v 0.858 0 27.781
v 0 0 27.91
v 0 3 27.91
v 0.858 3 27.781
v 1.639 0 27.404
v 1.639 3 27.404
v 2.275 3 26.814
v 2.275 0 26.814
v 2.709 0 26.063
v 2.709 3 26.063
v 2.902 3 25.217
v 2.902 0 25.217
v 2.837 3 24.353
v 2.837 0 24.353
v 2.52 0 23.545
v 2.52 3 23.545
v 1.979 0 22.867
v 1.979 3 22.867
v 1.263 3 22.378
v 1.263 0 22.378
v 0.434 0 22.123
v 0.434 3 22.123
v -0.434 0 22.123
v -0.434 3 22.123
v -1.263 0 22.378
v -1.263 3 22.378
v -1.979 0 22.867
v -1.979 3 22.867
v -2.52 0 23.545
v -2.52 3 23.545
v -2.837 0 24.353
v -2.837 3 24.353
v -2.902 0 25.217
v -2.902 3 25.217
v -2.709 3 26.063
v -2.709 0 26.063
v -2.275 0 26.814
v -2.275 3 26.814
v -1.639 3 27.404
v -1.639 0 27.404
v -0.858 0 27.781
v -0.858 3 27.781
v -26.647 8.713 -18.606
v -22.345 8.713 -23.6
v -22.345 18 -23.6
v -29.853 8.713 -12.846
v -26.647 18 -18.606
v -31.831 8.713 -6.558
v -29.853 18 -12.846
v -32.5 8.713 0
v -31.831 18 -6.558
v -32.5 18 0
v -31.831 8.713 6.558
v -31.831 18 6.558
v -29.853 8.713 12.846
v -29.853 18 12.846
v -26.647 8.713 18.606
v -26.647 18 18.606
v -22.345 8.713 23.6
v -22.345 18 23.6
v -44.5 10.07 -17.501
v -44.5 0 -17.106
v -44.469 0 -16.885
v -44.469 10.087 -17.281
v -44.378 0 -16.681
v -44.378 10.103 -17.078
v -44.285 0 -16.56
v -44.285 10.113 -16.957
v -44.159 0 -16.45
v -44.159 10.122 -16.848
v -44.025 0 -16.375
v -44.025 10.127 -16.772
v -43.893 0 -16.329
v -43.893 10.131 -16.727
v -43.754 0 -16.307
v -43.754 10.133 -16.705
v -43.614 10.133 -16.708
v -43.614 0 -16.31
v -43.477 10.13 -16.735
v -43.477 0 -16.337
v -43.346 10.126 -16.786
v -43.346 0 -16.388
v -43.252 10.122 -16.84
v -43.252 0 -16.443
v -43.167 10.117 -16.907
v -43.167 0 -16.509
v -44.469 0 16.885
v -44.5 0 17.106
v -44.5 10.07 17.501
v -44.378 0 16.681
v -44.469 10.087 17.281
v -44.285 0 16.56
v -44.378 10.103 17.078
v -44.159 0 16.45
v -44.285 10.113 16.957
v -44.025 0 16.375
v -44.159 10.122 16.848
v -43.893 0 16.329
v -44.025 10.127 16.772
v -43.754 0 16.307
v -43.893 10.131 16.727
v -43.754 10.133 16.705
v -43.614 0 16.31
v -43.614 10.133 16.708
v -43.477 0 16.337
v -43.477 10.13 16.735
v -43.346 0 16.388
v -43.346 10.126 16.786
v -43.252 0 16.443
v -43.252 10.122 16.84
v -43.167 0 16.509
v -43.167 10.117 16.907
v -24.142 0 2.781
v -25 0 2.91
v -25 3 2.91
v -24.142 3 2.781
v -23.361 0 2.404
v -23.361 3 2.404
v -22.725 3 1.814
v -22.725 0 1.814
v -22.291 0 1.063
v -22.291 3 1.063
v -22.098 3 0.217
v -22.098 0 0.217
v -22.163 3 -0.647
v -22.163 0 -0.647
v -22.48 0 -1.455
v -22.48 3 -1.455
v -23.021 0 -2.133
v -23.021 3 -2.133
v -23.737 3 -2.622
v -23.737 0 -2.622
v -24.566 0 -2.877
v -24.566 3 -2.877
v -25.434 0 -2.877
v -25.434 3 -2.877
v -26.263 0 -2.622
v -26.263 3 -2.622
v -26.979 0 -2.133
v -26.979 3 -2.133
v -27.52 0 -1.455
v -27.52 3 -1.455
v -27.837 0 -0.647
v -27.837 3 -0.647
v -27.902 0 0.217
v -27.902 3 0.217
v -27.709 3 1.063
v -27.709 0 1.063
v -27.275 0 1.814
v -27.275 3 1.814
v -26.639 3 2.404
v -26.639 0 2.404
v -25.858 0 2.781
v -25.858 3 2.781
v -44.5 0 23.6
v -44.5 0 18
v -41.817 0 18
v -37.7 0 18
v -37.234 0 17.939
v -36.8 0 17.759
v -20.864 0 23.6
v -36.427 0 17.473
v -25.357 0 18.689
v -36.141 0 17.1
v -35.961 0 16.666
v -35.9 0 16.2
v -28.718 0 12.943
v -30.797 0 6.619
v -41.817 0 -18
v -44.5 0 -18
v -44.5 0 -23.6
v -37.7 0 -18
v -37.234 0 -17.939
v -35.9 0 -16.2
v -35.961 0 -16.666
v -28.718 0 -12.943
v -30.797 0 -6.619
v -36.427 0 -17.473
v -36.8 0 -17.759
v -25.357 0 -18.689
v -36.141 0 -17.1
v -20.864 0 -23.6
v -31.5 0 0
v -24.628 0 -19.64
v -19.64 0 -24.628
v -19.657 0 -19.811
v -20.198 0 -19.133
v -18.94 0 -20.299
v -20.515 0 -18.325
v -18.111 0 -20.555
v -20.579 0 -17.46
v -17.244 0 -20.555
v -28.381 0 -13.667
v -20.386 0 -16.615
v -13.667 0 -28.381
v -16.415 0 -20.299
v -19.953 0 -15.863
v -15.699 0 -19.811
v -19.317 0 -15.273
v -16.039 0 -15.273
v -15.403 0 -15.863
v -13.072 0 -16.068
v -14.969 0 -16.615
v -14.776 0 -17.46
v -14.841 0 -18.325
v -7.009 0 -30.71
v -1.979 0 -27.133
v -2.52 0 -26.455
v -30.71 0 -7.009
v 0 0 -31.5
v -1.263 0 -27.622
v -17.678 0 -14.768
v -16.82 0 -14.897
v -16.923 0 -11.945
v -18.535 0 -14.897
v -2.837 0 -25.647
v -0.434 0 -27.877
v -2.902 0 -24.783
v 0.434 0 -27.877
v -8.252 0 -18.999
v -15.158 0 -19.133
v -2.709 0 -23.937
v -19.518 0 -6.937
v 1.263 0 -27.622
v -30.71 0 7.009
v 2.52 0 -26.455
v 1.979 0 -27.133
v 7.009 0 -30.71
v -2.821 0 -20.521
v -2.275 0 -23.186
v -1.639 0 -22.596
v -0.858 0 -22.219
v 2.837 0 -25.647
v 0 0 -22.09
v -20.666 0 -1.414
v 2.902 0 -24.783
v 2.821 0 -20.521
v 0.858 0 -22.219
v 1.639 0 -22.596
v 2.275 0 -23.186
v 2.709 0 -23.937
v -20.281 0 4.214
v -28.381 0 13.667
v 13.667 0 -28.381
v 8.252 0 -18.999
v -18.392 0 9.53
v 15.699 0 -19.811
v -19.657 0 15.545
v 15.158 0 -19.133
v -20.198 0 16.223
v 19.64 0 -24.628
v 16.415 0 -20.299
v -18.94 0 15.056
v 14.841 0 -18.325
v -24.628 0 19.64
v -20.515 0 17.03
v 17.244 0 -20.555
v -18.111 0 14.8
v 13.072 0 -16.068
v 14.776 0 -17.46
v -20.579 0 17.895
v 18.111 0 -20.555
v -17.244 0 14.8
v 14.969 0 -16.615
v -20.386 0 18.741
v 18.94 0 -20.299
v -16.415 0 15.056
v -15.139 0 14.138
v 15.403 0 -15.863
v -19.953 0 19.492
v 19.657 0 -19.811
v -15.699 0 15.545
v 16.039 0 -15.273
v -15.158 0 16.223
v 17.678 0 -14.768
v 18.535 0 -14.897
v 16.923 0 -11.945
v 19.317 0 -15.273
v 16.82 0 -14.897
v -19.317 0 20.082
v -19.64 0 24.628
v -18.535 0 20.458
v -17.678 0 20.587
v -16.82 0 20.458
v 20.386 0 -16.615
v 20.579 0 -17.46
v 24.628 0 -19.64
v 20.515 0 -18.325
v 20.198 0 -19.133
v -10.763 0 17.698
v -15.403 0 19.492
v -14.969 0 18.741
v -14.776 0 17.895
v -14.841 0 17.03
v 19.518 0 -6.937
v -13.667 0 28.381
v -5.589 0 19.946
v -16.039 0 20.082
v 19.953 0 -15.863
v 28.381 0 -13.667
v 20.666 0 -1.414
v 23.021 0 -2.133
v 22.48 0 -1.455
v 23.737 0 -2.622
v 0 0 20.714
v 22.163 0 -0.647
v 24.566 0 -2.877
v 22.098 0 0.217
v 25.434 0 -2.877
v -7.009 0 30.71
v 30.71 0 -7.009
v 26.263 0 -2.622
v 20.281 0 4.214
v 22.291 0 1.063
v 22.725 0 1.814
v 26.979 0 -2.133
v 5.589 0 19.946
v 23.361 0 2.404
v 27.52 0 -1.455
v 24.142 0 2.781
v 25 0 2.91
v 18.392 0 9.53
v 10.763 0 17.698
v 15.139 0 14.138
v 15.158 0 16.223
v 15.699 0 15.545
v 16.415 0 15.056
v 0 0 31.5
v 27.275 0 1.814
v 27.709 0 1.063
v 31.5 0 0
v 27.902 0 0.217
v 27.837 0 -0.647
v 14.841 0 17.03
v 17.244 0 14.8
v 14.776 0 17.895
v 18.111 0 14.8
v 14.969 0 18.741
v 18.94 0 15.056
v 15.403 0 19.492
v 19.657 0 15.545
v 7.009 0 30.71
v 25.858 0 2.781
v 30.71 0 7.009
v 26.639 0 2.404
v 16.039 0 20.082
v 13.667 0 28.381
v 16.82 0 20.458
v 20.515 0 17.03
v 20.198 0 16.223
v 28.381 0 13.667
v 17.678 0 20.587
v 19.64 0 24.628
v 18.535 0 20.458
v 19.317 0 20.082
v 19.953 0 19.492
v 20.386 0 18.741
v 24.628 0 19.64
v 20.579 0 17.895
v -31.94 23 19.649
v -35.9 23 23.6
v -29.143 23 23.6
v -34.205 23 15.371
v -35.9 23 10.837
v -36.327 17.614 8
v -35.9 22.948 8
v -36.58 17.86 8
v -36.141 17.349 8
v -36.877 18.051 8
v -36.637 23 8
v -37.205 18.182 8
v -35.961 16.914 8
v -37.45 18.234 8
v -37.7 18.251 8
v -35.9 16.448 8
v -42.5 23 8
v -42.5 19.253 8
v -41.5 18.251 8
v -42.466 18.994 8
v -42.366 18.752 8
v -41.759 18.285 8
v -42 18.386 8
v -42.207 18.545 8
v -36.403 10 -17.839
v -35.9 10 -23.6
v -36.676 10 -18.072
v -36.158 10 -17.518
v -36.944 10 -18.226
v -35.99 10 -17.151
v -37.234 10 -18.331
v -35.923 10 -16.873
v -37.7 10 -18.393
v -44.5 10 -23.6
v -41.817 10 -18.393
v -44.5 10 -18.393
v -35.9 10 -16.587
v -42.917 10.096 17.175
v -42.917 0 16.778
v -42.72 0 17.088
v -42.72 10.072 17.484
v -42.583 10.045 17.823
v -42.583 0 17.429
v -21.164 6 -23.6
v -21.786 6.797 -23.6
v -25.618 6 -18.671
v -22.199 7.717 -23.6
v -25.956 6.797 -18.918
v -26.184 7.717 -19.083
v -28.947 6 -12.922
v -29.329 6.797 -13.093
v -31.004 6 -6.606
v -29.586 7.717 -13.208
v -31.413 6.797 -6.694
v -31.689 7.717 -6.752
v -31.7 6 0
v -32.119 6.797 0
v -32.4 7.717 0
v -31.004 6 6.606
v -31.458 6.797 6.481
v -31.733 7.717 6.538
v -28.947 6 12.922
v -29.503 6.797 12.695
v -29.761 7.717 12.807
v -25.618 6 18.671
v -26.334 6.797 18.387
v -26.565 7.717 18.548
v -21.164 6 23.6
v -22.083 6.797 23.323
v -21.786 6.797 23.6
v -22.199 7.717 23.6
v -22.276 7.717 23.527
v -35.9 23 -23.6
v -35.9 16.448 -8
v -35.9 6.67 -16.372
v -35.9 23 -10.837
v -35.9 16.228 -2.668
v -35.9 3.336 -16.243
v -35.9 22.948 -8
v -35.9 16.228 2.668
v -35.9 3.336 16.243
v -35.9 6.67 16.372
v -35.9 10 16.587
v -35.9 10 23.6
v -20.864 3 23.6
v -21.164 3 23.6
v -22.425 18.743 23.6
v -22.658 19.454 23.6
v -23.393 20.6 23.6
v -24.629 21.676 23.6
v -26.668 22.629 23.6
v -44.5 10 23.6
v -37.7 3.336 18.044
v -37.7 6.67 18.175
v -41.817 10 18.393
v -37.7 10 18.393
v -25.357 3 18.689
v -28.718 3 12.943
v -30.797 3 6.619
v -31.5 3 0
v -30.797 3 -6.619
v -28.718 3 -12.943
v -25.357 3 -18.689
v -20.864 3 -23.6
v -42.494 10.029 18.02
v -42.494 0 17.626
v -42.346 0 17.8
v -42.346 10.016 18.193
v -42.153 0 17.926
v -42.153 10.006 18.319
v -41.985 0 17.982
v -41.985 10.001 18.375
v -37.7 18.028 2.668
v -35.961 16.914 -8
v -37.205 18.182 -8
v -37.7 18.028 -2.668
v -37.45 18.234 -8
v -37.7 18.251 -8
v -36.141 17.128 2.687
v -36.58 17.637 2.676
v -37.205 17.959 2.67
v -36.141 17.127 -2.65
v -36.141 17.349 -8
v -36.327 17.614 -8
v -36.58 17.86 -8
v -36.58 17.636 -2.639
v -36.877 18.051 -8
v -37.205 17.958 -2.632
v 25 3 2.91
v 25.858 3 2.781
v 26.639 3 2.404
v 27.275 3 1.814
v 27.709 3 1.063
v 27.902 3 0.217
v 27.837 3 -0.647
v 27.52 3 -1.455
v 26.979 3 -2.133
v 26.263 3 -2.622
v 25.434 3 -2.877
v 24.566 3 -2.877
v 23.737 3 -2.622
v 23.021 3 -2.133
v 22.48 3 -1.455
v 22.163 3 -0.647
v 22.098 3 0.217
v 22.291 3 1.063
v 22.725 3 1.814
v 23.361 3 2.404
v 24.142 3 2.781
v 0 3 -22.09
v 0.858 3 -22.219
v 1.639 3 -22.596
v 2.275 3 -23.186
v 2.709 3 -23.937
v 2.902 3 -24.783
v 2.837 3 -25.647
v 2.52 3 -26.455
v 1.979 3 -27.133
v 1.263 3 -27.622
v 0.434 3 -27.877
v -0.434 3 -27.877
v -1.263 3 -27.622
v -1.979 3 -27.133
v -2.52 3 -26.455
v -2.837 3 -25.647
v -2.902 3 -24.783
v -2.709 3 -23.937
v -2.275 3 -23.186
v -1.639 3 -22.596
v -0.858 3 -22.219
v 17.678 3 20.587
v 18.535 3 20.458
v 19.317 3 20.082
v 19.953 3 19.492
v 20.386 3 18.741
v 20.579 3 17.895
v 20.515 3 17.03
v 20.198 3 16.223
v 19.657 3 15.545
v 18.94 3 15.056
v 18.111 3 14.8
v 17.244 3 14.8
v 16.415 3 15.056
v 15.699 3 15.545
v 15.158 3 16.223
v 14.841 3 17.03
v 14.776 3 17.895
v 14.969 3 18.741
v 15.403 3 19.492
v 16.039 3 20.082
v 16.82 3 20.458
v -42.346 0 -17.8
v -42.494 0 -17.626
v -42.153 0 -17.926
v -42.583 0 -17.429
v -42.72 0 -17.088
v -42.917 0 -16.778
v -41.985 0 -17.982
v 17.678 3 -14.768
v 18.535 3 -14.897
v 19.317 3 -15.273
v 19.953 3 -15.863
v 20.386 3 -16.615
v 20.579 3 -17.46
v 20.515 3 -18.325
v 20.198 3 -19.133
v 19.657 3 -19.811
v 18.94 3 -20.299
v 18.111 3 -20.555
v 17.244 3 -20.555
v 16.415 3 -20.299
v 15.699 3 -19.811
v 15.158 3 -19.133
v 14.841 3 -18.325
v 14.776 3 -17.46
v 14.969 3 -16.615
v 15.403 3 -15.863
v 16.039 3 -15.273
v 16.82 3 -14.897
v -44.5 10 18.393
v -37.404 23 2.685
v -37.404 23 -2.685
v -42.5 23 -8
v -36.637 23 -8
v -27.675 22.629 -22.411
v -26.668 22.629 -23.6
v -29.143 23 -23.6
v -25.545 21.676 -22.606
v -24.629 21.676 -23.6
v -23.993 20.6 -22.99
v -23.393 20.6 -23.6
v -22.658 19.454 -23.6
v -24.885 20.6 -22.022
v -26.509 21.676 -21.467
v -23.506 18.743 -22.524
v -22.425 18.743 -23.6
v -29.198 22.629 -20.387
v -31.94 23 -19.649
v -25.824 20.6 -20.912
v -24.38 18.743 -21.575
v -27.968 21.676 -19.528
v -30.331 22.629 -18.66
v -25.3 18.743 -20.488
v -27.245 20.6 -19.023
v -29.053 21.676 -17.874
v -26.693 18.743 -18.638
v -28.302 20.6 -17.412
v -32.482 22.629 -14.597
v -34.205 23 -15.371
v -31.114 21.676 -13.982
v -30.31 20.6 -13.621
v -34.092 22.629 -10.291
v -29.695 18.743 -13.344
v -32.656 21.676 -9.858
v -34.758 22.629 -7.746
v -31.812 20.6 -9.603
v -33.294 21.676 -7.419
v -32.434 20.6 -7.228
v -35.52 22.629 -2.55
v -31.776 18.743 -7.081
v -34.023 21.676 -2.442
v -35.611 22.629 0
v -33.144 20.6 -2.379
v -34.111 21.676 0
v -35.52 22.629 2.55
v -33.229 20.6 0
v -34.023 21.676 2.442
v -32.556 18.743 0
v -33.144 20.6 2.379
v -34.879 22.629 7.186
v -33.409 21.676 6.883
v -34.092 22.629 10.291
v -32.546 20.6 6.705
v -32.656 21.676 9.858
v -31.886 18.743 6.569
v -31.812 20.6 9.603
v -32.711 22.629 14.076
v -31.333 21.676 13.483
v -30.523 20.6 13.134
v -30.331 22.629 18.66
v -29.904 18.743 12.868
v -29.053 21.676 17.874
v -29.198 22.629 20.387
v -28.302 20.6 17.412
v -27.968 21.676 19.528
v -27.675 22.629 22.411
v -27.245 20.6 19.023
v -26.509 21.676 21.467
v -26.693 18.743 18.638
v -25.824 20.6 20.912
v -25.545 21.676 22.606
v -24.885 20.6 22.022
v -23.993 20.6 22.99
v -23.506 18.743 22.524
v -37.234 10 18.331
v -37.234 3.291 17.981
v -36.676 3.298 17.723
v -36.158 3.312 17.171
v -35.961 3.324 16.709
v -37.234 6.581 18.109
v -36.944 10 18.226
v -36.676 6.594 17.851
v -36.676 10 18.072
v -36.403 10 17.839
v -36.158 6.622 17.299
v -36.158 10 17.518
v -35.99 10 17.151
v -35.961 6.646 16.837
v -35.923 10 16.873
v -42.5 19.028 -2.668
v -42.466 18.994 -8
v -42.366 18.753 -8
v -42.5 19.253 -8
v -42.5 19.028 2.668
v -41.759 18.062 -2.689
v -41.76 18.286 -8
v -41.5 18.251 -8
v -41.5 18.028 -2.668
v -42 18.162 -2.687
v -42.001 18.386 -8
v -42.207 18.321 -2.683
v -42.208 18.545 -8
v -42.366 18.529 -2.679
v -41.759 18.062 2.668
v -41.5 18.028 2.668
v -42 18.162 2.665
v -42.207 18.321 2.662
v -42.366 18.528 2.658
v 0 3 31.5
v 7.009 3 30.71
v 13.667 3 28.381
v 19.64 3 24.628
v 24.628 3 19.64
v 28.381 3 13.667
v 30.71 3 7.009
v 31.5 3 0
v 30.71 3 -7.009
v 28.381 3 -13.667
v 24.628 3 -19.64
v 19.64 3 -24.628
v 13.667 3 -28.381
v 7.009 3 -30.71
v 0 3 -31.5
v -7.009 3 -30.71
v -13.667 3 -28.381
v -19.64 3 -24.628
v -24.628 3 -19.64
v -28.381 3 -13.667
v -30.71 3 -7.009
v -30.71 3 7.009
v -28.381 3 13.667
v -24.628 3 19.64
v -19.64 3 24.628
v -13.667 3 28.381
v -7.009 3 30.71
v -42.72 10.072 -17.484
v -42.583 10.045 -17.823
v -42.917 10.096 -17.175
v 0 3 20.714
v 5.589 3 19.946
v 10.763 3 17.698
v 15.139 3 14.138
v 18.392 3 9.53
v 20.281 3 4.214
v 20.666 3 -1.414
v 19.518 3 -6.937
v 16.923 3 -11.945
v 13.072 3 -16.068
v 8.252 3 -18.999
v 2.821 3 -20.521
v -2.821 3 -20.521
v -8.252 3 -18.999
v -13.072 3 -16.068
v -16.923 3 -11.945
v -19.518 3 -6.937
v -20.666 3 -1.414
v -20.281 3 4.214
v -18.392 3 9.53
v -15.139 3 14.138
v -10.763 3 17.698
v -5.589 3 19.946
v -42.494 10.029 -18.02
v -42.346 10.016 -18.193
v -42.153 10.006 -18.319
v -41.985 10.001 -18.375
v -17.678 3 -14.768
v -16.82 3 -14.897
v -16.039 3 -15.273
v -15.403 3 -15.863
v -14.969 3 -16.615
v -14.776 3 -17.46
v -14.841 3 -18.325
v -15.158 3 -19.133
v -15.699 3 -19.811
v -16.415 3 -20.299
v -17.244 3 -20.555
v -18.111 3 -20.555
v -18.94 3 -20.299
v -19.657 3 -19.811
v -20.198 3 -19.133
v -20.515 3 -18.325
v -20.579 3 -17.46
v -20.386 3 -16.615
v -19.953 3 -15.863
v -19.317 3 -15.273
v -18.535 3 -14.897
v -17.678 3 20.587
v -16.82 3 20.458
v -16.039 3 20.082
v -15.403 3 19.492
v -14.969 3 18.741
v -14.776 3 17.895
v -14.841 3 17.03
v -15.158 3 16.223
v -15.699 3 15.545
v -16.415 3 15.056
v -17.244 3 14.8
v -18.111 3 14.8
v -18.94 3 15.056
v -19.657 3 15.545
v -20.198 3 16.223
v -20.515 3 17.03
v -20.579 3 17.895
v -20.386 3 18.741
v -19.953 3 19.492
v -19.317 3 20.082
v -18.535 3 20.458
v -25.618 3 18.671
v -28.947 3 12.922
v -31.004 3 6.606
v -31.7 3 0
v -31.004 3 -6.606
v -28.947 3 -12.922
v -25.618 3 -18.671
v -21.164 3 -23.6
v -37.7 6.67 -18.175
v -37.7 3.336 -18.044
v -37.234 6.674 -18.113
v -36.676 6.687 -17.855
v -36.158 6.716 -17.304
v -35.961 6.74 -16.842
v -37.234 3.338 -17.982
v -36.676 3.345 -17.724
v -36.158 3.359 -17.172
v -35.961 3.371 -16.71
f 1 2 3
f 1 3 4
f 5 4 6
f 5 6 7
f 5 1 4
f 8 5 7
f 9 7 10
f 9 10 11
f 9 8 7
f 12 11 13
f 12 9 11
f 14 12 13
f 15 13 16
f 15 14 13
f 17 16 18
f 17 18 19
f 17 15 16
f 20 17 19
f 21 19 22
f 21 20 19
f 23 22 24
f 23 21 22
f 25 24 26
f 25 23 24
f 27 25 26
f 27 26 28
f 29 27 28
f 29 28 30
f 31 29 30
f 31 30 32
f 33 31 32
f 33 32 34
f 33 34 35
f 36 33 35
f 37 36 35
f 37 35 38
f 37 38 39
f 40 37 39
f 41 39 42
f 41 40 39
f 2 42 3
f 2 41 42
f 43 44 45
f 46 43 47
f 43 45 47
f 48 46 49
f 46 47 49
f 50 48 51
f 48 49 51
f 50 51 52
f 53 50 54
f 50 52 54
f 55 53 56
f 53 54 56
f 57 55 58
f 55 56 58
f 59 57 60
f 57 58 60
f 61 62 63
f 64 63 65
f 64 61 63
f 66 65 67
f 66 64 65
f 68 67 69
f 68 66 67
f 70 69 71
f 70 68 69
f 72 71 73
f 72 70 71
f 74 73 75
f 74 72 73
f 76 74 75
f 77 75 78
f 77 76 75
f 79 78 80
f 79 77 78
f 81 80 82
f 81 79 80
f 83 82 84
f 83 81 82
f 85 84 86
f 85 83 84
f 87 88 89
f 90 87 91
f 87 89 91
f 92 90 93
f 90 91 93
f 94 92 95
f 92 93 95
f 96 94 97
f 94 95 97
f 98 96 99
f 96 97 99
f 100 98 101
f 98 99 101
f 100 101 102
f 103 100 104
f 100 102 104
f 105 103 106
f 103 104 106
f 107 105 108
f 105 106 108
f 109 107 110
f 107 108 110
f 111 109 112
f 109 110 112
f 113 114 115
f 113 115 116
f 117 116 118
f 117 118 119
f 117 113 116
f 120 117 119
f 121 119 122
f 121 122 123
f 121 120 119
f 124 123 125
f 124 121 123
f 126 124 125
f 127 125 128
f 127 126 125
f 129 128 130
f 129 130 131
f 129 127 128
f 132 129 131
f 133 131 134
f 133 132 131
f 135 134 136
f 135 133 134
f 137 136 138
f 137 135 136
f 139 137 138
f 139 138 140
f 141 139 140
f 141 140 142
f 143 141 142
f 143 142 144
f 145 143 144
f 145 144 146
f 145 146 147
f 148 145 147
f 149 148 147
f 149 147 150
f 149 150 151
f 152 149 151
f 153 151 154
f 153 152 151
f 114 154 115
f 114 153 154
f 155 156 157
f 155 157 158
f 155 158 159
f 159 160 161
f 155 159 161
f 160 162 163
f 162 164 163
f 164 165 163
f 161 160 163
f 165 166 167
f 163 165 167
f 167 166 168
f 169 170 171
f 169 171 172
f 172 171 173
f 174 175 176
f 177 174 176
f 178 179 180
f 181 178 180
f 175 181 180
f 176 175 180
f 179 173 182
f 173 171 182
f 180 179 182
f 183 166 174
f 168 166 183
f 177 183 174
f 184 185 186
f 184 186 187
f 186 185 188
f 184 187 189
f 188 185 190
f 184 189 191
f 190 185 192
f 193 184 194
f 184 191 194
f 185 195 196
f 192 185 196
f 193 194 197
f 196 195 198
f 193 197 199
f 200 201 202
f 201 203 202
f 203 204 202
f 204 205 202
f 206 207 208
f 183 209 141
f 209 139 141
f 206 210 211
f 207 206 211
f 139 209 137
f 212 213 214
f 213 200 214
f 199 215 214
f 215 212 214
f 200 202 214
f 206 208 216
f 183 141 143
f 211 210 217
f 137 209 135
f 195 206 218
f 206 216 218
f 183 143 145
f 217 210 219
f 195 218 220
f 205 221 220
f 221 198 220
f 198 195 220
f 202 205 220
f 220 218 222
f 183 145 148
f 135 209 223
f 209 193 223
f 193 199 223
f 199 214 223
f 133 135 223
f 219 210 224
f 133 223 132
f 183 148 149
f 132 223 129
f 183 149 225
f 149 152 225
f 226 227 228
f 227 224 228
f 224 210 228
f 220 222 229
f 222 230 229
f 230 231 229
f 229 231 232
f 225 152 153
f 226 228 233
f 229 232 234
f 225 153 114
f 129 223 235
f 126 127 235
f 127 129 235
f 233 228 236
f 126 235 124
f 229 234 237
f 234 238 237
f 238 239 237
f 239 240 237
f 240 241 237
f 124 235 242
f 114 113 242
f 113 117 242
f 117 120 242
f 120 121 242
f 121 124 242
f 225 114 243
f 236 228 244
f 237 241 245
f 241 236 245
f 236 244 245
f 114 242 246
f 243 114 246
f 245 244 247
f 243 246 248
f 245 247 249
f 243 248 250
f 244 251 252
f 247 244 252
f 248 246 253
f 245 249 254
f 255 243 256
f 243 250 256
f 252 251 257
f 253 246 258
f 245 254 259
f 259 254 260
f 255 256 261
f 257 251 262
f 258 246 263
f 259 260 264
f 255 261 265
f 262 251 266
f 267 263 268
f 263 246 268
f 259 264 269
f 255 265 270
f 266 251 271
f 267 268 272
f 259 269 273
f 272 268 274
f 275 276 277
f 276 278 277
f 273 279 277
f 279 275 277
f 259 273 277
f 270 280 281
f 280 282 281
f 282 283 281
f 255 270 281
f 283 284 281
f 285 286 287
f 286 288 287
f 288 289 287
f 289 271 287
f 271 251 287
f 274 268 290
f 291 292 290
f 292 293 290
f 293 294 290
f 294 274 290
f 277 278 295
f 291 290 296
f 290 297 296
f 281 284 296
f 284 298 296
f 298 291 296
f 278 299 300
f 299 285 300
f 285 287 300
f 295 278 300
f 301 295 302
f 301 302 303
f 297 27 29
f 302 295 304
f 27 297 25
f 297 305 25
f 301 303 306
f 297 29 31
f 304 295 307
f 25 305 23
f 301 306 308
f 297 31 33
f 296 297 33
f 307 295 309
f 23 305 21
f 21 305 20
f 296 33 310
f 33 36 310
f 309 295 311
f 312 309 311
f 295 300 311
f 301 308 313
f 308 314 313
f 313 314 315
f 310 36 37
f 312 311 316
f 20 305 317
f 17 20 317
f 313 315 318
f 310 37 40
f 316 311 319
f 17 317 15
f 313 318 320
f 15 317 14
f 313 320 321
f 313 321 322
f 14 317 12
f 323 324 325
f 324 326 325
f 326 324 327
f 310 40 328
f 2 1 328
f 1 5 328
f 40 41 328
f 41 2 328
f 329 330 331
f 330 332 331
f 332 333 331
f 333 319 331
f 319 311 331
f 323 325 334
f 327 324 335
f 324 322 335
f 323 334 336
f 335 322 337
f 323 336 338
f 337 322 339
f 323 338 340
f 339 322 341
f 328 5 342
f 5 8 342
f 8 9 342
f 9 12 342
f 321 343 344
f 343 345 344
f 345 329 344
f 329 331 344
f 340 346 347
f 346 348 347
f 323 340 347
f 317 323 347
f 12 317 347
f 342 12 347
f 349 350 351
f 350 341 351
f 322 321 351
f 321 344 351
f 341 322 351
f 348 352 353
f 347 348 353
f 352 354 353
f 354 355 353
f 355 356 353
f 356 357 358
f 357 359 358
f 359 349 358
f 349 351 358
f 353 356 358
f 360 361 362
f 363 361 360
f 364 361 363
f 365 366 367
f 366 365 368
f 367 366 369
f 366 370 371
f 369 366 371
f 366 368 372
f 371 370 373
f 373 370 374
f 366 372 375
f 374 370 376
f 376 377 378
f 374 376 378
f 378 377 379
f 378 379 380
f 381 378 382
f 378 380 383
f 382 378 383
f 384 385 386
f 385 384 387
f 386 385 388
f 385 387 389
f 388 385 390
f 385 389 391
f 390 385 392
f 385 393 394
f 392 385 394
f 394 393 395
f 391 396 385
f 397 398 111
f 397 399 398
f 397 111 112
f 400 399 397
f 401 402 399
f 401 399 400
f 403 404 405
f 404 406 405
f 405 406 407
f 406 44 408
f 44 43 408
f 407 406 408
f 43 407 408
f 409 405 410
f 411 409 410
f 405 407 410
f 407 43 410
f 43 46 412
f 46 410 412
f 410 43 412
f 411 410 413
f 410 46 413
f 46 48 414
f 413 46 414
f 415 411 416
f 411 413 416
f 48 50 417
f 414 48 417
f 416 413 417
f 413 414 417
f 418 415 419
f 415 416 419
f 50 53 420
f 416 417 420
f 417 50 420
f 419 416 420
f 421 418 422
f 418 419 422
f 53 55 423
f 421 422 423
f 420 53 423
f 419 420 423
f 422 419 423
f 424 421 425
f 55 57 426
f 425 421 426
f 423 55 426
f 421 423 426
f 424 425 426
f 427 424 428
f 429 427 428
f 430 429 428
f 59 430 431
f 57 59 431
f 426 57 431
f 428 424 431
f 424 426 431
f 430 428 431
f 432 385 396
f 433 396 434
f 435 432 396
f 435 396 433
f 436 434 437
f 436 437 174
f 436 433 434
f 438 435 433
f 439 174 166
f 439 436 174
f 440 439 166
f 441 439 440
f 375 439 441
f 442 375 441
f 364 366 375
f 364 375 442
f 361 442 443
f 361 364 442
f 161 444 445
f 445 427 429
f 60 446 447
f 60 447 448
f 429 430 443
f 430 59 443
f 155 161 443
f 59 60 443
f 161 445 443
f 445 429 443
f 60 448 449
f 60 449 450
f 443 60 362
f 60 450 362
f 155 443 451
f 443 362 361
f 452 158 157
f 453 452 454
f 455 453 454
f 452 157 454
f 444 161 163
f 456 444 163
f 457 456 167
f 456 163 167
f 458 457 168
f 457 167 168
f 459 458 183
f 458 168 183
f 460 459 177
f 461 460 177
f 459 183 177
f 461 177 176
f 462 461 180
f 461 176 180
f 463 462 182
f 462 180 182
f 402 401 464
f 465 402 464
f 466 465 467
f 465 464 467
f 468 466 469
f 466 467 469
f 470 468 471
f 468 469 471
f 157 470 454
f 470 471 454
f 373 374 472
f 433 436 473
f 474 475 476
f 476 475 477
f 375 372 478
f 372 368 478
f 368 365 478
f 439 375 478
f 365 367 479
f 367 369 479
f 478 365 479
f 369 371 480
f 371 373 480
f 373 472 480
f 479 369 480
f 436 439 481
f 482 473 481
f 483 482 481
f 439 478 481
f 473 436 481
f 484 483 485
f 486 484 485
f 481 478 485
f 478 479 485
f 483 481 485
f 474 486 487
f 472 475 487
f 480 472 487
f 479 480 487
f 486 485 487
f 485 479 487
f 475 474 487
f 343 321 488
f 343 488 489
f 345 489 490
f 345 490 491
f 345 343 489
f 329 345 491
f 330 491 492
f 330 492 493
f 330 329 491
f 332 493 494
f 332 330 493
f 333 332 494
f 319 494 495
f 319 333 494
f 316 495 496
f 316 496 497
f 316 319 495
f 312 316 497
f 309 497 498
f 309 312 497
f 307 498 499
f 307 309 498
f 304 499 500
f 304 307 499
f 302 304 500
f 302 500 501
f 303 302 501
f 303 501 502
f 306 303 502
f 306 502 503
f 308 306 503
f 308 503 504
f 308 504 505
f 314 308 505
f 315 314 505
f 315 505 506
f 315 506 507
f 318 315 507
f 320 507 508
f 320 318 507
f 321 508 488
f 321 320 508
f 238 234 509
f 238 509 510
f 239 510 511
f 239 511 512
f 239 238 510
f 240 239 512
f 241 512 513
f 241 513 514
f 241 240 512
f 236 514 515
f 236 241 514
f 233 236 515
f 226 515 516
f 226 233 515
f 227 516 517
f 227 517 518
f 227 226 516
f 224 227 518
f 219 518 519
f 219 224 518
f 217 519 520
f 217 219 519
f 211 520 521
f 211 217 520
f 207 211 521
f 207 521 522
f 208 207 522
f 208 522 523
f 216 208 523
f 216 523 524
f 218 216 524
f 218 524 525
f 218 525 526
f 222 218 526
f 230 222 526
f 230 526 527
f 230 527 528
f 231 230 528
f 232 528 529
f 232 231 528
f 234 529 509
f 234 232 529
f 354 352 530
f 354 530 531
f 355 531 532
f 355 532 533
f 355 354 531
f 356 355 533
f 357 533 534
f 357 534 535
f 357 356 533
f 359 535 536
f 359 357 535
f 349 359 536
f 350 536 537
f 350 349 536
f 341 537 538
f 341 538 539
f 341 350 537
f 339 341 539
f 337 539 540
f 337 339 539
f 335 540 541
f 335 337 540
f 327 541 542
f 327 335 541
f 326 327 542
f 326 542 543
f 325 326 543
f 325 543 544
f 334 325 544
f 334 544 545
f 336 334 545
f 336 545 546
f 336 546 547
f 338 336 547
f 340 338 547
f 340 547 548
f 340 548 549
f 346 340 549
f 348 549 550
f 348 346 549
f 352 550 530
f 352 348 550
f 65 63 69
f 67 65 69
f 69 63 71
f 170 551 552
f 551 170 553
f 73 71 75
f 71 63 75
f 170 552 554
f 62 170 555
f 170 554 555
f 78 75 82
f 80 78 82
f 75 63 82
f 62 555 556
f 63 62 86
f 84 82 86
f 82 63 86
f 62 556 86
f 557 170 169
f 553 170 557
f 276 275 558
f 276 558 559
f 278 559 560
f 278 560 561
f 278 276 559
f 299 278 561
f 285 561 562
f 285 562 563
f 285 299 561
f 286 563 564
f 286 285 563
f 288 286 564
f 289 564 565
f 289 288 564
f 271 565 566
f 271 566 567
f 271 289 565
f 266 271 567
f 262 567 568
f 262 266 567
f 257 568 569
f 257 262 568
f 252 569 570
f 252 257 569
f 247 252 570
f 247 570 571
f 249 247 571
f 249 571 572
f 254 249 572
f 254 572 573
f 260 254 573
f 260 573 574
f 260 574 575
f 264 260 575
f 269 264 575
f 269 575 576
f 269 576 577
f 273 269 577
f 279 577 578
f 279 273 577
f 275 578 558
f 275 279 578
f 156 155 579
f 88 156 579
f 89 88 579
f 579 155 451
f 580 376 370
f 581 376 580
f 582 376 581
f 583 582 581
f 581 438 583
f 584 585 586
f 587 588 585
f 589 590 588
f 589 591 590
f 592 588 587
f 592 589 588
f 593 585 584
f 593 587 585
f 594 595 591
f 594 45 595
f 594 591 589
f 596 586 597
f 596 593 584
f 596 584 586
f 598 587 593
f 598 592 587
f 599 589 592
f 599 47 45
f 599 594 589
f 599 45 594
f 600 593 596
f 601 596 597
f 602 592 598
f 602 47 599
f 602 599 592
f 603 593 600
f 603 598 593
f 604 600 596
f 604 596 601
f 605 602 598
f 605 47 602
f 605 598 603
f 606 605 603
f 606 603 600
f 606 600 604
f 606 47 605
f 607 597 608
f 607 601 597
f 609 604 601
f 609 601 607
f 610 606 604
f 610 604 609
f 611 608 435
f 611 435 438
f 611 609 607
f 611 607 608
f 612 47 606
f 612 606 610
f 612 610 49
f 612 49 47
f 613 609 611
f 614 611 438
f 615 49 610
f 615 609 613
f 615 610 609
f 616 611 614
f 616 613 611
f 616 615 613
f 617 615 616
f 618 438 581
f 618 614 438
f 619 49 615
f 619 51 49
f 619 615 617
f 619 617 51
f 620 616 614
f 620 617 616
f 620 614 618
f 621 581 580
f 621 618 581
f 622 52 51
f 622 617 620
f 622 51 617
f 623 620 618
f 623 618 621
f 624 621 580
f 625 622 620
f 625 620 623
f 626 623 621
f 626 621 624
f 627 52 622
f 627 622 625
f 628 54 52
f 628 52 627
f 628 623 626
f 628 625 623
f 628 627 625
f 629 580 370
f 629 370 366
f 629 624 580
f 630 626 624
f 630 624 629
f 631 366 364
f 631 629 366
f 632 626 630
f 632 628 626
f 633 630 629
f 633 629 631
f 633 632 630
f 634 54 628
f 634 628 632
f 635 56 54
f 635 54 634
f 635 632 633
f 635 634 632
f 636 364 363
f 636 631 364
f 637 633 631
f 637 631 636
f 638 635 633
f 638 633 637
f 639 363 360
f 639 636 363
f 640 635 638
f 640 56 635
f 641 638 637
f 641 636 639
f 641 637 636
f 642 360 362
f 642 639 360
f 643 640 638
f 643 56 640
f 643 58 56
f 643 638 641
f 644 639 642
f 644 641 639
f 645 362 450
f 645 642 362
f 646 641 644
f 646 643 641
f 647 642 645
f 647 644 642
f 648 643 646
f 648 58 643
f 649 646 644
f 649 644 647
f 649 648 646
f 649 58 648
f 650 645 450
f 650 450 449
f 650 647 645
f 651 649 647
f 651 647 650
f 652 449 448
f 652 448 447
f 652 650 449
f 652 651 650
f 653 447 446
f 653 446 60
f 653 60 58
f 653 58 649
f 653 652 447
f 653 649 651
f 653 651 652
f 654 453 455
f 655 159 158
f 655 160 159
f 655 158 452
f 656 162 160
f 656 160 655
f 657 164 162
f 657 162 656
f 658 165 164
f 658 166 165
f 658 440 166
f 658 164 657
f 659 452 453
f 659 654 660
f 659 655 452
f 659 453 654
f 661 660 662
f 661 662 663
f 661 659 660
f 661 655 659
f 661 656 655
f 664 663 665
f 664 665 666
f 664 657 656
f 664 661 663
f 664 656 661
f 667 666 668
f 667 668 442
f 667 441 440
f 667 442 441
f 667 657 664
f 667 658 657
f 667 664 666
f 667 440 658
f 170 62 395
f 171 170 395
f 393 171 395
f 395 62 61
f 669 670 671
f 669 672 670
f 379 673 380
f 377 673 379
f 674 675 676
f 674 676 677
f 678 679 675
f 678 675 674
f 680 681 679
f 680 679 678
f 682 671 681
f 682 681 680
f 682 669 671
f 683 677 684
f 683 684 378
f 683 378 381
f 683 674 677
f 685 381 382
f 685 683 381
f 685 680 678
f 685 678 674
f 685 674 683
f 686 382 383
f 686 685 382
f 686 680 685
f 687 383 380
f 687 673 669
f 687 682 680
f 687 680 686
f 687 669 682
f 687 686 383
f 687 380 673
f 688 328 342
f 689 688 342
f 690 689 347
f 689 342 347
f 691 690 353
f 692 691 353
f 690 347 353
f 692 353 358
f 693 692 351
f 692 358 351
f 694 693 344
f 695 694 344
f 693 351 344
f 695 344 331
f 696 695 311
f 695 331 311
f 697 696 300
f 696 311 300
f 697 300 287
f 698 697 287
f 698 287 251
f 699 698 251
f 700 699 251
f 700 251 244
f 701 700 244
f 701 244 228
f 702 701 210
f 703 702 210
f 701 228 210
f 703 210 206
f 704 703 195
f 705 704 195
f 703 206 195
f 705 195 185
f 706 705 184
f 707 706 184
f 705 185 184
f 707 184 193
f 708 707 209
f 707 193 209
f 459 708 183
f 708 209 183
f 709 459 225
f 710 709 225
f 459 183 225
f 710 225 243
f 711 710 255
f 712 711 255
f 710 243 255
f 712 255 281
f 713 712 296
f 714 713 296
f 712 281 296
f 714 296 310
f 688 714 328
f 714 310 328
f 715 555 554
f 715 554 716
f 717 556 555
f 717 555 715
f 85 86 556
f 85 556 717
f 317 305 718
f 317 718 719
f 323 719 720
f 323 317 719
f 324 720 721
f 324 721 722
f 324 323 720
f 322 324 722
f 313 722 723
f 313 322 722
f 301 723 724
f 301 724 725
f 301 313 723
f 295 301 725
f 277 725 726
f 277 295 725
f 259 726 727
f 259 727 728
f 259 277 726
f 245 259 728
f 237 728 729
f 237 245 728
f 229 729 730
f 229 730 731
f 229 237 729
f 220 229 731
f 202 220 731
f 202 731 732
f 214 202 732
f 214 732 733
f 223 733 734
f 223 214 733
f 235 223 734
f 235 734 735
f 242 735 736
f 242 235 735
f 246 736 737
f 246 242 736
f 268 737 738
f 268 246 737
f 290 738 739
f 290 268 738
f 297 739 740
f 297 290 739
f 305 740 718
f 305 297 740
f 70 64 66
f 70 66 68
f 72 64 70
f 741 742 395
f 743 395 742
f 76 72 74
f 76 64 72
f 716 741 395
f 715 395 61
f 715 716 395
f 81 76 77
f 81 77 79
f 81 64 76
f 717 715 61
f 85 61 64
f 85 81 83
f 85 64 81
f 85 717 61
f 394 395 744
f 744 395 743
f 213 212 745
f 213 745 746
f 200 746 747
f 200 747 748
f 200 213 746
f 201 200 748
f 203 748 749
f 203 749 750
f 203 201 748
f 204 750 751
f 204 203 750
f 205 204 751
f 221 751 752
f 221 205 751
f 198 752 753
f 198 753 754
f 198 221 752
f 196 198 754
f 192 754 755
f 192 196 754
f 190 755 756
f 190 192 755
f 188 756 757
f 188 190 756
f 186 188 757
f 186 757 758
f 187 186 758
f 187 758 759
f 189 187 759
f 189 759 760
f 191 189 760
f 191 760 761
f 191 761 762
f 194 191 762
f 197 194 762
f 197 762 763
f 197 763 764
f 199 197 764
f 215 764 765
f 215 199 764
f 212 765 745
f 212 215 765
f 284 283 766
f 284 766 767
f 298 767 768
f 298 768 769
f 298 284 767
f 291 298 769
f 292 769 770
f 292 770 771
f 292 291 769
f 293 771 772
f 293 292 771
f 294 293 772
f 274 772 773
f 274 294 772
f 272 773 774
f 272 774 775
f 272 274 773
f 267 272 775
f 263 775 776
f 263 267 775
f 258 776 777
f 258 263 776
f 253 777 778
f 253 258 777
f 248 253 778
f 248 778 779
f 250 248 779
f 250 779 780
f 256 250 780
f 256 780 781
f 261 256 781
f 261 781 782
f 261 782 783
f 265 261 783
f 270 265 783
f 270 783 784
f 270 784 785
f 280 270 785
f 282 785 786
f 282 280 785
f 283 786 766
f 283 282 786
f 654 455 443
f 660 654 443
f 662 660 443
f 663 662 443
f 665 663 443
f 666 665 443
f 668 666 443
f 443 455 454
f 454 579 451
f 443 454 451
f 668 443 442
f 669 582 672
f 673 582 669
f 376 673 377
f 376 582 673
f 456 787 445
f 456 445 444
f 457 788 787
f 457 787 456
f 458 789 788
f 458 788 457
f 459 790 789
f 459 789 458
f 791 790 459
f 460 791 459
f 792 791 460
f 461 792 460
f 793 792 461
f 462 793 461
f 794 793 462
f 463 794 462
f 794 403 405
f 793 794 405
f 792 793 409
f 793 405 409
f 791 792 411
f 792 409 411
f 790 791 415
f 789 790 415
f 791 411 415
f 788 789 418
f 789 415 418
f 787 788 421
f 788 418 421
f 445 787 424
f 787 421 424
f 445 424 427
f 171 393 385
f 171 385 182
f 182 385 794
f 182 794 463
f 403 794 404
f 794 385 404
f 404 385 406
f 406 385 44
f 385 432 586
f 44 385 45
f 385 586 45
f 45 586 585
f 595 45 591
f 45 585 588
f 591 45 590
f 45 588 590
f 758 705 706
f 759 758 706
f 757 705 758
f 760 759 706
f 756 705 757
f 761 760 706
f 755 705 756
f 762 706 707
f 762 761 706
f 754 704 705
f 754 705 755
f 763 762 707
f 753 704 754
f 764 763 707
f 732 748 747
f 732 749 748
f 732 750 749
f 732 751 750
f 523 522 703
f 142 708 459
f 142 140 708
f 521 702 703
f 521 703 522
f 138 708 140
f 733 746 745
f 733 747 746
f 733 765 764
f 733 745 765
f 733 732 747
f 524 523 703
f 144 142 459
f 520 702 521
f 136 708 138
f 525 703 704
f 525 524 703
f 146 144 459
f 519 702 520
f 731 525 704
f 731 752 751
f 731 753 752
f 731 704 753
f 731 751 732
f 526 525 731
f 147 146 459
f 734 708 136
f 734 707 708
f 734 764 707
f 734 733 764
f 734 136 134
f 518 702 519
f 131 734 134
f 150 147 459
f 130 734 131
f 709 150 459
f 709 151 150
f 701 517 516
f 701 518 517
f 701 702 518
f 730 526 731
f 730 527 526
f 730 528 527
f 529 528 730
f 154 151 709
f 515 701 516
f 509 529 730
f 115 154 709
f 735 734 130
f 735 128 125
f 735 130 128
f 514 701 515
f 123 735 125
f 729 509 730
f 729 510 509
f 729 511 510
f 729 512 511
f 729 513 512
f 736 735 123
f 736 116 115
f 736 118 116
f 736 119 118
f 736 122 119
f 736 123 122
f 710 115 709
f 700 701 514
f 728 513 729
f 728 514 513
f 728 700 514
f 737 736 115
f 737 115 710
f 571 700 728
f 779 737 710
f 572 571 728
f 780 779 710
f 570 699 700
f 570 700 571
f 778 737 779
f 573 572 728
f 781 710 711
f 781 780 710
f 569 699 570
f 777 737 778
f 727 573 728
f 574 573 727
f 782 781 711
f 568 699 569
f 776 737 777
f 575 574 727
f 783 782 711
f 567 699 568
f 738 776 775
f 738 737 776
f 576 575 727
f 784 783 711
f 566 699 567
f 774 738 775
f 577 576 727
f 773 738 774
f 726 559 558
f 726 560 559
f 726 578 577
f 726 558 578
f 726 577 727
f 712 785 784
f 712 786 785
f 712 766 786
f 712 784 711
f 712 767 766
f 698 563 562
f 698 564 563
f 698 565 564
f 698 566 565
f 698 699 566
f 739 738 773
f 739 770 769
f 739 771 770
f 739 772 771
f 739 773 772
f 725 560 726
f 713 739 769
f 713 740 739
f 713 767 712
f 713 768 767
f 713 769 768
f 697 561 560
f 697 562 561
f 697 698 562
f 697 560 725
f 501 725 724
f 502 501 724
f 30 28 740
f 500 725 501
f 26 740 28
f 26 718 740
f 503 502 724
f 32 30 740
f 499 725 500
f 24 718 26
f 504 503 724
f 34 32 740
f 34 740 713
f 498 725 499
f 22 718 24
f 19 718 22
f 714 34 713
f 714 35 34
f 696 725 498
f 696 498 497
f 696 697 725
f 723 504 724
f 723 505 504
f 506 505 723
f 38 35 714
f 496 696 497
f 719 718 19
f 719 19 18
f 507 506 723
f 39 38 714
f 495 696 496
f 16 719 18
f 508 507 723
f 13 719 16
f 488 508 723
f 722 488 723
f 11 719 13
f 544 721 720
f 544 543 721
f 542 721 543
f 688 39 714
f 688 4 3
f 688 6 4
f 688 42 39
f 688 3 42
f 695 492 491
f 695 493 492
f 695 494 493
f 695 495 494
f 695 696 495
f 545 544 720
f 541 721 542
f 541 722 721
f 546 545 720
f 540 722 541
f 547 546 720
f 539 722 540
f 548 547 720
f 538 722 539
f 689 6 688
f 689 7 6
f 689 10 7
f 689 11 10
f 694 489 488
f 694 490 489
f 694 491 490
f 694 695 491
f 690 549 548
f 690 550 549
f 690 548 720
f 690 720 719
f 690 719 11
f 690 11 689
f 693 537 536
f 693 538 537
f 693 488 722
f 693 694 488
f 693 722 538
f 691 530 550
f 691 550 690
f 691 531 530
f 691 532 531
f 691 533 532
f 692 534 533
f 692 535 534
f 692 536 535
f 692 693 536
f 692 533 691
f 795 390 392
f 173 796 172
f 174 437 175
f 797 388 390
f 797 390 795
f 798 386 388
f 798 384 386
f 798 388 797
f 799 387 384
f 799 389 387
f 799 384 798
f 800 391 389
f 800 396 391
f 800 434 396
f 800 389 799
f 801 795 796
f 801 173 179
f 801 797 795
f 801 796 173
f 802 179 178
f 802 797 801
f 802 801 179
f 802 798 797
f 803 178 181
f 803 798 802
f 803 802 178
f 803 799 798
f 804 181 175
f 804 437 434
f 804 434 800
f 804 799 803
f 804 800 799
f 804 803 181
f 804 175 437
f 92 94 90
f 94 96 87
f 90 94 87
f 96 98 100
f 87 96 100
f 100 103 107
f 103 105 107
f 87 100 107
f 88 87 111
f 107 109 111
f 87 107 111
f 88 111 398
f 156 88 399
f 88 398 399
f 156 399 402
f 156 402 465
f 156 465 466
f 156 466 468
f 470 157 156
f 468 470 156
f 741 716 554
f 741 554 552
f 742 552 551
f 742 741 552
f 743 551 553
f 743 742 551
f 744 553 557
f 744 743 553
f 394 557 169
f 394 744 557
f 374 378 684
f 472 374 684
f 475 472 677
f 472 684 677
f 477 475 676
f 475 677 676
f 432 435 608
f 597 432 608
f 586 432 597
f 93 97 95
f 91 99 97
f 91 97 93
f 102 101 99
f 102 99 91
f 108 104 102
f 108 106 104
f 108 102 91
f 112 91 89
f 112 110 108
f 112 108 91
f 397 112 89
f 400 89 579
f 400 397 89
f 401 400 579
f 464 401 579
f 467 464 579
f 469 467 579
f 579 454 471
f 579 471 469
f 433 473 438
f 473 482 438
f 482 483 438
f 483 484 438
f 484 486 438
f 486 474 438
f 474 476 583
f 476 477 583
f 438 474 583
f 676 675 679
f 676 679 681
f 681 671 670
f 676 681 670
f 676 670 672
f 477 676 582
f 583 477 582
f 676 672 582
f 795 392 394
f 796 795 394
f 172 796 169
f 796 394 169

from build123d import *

# Parameters (mm, degrees)
SKETCH_1_R          = 31.5
SKETCH_1_R_2        = 20.714023716
SKETCH_1_R_3        = 2.909798399
EXTRUDE_1_DEPTH     = 3
EXTRUDE_2_DEPTH     = 23
CUT_EXTRUDE_1_DEPTH = 8.6
SKETCH_5_R          = 32.5
CUT_EXTRUDE_2_DEPTH = 17
FILLET_1_R          = 5
FILLET_2_R          = 1.8
FILLET_4_R          = 0.8
FILLET_5_R          = 0.8
SKETCH_8_W          = 38.793065546
SKETCH_8_H          = 19.973810534
CUT_EXTRUDE_3_DEPTH = 2
FILLET_6_R          = 1
SKETCH_9_R          = 31.7
CUT_EXTRUDE_4_DEPTH = 3
FILLET_7_R          = 5


with BuildPart() as part:
    # 草图1 → 凸台-拉伸1 (new body)
    with BuildSketch(Plane(origin=(0, 0, 0), x_dir=(1, 0, 0), z_dir=(0, 1, 0))):
        with Locations(Location((0, 0, 0), (0, 0, 270))):
            Circle(SKETCH_1_R)
        with Locations(Location((0, 0, 0), (0, 0, 270))):
            Circle(SKETCH_1_R_2, mode=Mode.SUBTRACT)
        with Locations(Location((0, -25, 0), (0, 0, 270))):
            Circle(SKETCH_1_R_3, mode=Mode.SUBTRACT)
        with Locations(Location((-17.67766953, -17.67766953, 0), (0, 0, 270))):
            Circle(SKETCH_1_R_3, mode=Mode.SUBTRACT)
        with Locations(Location((-25, 0, 0), (0, 0, 270))):
            Circle(SKETCH_1_R_3, mode=Mode.SUBTRACT)
        with Locations(Location((-17.67766953, 17.67766953, 0), (0, 0, 270))):
            Circle(SKETCH_1_R_3, mode=Mode.SUBTRACT)
        with Locations(Location((0, 25, 0), (0, 0, 270))):
            Circle(SKETCH_1_R_3, mode=Mode.SUBTRACT)
        with Locations(Location((17.67766953, 17.67766953, 0), (0, 0, 270))):
            Circle(SKETCH_1_R_3, mode=Mode.SUBTRACT)
        with Locations(Location((25, 0, 0), (0, 0, 270))):
            Circle(SKETCH_1_R_3, mode=Mode.SUBTRACT)
        with Locations(Location((17.67766953, -17.67766953, 0), (0, 0, 270))):
            Circle(SKETCH_1_R_3, mode=Mode.SUBTRACT)
    extrude(amount=EXTRUDE_1_DEPTH)


with BuildPart() as body_2:
    # 草图2 → 凸台-拉伸2 (new body)
    with BuildSketch(Plane(origin=(0, 0, 0), x_dir=(1, 0, 0), z_dir=(0, 1, 0))):
        with BuildLine():
            Line((-44.5, 23.6), (-44.5, -23.6))
            Line((-44.5, -23.6), (-20.863604674, -23.6))
            ThreePointArc((-20.863604674, -23.6), (-31.5, 0), (-20.863604674, 23.6))
            Line((-20.863604674, 23.6), (-44.5, 23.6))
        make_face()
    extrude(amount=EXTRUDE_2_DEPTH)

    # 草图3 → 切除-拉伸1 (cut)
    with BuildSketch(Plane.ZY.offset(44.5)):
        with BuildLine():
            Line((-8, 18.251227904), (-8, 23))
            Line((-8, 23), (-23.6, 23))
            Line((-23.6, 23), (-23.6, 10))
            Line((-23.6, 10), (-18.392761811, 10))
            ThreePointArc((-18.392761811, 10), (-18.098228291, 5.00385506), (-18, 0))
            Line((-18, 0), (18, 0))
            ThreePointArc((18, 0), (18.098228291, 5.00385506), (18.392761811, 10))
            Line((18.392761811, 10), (23.6, 10))
            Line((23.6, 10), (23.6, 23))
            Line((23.6, 23), (8, 23))
            Line((8, 23), (8, 18.251227904))
            ThreePointArc((8, 18.251227904), (0, 18), (-8, 18.251227904))
        make_face()
    extrude(amount=-CUT_EXTRUDE_1_DEPTH, mode=Mode.SUBTRACT)

    # 草图5 → 切除-拉伸2 (cut)
    with BuildSketch(Plane(origin=(0, 23, 0), x_dir=(1, 0, 0), z_dir=(0, 1, 0))):
        Circle(SKETCH_5_R)
    extrude(amount=-CUT_EXTRUDE_2_DEPTH, mode=Mode.SUBTRACT)

    # 圆角1
    # the kernel refuses this fillet: 5 mm, written as the material it takes off along each edge
    with BuildSketch(Plane(origin=(0, 23, 0), x_dir=(-0.3646941876618019, 0, -0.9311273540637169), z_dir=(0.9311273540637169, 0, -0.3646941876618019))) as fillet_1_piece_1:
        with BuildLine():
            CenterArc((32.5 + FILLET_1_R, -FILLET_1_R), FILLET_1_R, 90, 90)
            Line((32.5, -FILLET_1_R), (32.5, 0))
            Line((32.5, 0), (32.5 + FILLET_1_R, 0))
        make_face()
    revolve(axis=Axis((0, 23, 0), (0, 1, 0)), revolution_arc=137.222472588, mode=Mode.SUBTRACT)

    # 圆角2
    fillet_2_edges = [body_2.edges().sort_by_distance(p)[0] for p in [
        (-35.9, 5.00385506, 18.098228291),
        (-35.9, 5.00385506, -18.098228291),
        (-35.9, 18, 0),
    ]]
    fillet(fillet_2_edges, radius=FILLET_2_R)

    # 扫描1: sweep along a curve in space
    with BuildLine() as sweep_1_path:
        ThreePointArc((-44.5, 0, 18), (-44.5, 5.00385506, 18.098228291), (-44.5, 10, 18.392761811))
    # 草图6 → 扫描1 (sweep)
    with BuildSketch(Plane(origin=(0, 0, 0), x_dir=(1, 0, 0), z_dir=(0, 1, 0))):
        with BuildLine():
            Line((-44.5, -18), (-44.5, -16))
            ThreePointArc((-44.5, -16), (-43.085786438, -16.585786438), (-42.5, -18))
            Line((-42.5, -18), (-44.5, -18))
        make_face()
    sweep(path=sweep_1_path.line)

    # 扫描2: sweep along a curve in space
    with BuildLine() as sweep_2_path:
        ThreePointArc((-44.5, 0, -18), (-44.5, 5.00385506, -18.098228291), (-44.5, 10, -18.392761811))
    # 草图7 → 扫描2 (sweep)
    with BuildSketch(Plane(origin=(0, 0, 0), x_dir=(1, 0, 0), z_dir=(0, 1, 0))):
        with BuildLine():
            Line((-44.5, 18), (-44.5, 16))
            ThreePointArc((-44.5, 16), (-43.085786438, 16.585786438), (-42.5, 18))
            Line((-42.5, 18), (-44.5, 18))
        make_face()
    sweep(path=sweep_2_path.line)

    # 圆角4
    fillet_4_edges = [body_2.edges().sort_by_distance(p)[0] for p in [
        (-44.5, 5.082346904, 16.099769127),
        (-42.5, 5.00385506, -18.098228291),
        (-44.5, 5.082346904, -16.099769127),
    ]]
    fillet(fillet_4_edges, radius=FILLET_4_R)

    # 圆角5
    fillet_5_edges = [body_2.edges().sort_by_distance(p)[0] for p in [
        (-42.5, 5.00385506, 18.098228291),
    ]]
    fillet(fillet_5_edges, radius=FILLET_5_R)

    # 草图8 → 切除-拉伸3 (cut)
    with BuildSketch(Plane.ZY.offset(44.5)):
        with Locations((-8.315025409, 25.620375372)):
            Rectangle(SKETCH_8_W, SKETCH_8_H)
    extrude(amount=-CUT_EXTRUDE_3_DEPTH, mode=Mode.SUBTRACT)

    # 圆角6
    fillet_6_edges = [body_2.edges().sort_by_distance(p)[0] for p in [
        (-42.5, 18, 0),
    ]]
    fillet(fillet_6_edges, radius=FILLET_6_R)

    # 草图9 → 切除-拉伸4 (cut)
    with BuildSketch(Plane(origin=(0, 6, 0), x_dir=(1, 0, 0), z_dir=(0, 1, 0))):
        Circle(SKETCH_9_R)
    extrude(amount=-CUT_EXTRUDE_4_DEPTH, mode=Mode.SUBTRACT)

    # 圆角7
    # the kernel refuses this fillet: 5 mm, written as the material it adds along each edge
    with BuildSketch(Plane(origin=(0, 6, 0), x_dir=(-0.5220974400053939, 0, -0.8528858441431738), z_dir=(0.8528858441431738, 0, -0.5220974400053939))) as fillet_7_piece_1_section:
        with BuildLine():
            CenterArc((27.5, 2.712931993), FILLET_7_R, 327.140119621, 32.859880379)
            Line((31.7, 0), (31.784, -0.05425864))
            ThreePointArc((31.784, -0.05425864), (32.1, -0.1), (32.5, -0.1))
            Line((32.5, -0.1), (32.6, 0))
            Line((32.6, 0), (32.6, 2.712931993))
            Line((32.6, 2.712931993), (32.5, 2.712931993))
        make_face()
    fillet_7_piece_1 = revolve(axis=Axis((0, 6, 0), (0, 1, 0)), revolution_arc=117.053901852, mode=Mode.PRIVATE)
    fillet_7_piece_1 = split(fillet_7_piece_1, bisect_by=Plane(origin=(-32.332369632, 7.28794393, 23.6), z_dir=(0, 0, -1)), keep=Keep.TOP, mode=Mode.PRIVATE)
    fillet_7_piece_1 = split(fillet_7_piece_1, bisect_by=Plane(origin=(-32.332369632, 7.28794393, -23.6), z_dir=(0, 0, 1)), keep=Keep.TOP, mode=Mode.PRIVATE)
    add(fillet_7_piece_1)


solid = Compound([part.part, body_2.part])
